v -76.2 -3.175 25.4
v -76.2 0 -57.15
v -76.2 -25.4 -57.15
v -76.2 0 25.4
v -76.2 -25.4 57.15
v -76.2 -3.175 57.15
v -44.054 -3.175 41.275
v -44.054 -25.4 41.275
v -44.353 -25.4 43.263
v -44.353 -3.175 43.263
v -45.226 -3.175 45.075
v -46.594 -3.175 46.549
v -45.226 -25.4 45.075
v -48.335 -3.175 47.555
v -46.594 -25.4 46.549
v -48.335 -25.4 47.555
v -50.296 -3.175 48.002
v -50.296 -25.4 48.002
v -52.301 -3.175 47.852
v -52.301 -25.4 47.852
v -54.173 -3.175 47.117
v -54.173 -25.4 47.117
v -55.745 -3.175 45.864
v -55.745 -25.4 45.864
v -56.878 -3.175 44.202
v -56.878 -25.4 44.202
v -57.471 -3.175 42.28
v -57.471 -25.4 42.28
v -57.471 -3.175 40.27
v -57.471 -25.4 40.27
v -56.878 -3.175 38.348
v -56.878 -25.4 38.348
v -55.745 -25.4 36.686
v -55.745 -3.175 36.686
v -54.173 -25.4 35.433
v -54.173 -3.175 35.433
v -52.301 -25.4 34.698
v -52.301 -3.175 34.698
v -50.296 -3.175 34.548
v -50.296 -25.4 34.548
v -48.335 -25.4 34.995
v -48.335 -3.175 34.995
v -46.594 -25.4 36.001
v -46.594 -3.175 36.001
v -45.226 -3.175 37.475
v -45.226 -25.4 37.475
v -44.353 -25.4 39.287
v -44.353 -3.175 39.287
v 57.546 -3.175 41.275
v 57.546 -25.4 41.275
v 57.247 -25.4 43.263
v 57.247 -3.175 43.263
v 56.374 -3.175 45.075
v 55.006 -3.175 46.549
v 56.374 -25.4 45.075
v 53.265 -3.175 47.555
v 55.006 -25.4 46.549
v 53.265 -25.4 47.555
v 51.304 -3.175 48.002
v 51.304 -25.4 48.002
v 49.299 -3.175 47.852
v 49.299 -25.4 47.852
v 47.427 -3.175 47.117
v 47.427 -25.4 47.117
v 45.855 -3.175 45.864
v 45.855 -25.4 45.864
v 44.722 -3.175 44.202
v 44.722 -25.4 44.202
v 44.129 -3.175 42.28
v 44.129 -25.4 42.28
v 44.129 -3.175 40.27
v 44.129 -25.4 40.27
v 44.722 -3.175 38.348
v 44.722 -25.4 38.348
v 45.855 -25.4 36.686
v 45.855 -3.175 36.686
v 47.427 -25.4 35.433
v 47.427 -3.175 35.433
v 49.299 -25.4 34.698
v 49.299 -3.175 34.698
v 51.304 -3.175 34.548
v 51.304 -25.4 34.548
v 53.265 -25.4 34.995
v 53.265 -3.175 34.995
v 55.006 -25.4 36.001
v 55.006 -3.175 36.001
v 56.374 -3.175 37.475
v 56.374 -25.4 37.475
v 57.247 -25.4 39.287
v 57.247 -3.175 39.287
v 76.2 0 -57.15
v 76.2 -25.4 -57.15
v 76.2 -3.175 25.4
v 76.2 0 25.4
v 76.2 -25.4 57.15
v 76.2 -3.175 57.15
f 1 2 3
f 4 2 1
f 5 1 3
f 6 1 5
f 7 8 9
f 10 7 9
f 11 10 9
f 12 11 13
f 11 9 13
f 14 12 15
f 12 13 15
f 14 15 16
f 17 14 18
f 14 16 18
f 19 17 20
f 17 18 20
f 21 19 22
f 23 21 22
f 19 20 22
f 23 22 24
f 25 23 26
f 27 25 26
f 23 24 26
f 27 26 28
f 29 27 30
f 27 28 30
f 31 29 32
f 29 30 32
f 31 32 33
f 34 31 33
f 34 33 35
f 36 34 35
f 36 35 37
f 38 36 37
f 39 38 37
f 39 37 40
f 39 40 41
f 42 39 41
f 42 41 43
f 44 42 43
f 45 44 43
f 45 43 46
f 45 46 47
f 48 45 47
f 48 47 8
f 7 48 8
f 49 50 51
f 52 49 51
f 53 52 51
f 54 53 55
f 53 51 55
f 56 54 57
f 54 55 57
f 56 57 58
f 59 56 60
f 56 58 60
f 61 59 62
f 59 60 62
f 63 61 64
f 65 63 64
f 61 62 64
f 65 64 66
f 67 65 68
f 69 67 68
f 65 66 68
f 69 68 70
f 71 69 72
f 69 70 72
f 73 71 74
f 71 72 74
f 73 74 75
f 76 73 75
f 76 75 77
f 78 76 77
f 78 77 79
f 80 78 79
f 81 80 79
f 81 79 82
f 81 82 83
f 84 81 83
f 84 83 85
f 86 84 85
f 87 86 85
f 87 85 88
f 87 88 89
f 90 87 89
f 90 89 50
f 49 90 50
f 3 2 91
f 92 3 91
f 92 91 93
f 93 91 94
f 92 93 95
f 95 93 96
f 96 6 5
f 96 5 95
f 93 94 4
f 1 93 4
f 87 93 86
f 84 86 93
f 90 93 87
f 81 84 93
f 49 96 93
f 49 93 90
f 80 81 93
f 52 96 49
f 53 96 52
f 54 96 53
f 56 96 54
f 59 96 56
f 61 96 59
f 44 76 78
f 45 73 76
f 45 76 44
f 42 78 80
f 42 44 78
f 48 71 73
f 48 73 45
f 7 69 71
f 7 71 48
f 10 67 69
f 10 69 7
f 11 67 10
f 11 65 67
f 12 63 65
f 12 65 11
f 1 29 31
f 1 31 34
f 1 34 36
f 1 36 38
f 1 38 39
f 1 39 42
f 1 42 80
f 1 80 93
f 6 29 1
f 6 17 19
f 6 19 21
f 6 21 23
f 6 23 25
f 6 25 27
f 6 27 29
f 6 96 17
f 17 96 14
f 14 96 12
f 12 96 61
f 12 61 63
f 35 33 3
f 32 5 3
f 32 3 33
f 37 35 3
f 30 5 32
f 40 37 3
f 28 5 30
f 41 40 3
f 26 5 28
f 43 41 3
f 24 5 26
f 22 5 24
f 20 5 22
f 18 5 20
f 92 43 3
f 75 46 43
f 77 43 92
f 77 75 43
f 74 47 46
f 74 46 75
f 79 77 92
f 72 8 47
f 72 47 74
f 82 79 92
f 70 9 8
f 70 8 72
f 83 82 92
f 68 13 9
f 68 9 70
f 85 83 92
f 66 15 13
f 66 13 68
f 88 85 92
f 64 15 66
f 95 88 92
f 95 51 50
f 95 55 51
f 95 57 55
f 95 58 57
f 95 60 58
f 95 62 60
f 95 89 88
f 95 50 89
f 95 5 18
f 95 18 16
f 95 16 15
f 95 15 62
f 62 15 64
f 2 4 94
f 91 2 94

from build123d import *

# Parameters (mm, degrees)
F0_W     = 152.4
F0_H     = 114.3
F1_DEPTH = 25.4
F2_W     = 152.4
F2_H     = 31.75
F3_DEPTH = 3.175
F5_D     = 13.49248


with BuildPart() as f1:
    # F0 (on Front) → F1 (new body)
    with BuildSketch(Plane.XZ):
        Rectangle(F0_W, F0_H)
    extrude(amount=F1_DEPTH)

    # F2 (on face) → F3 (cut)
    with BuildSketch(Plane(origin=(0, 0, 0), x_dir=(-1, 0, 0), z_dir=(0, 1, 0))):
        with Locations((0, 41.275)):
            Rectangle(F2_W, F2_H)
    extrude(amount=-F3_DEPTH, mode=Mode.SUBTRACT)

    # F5 (through all)
    with Locations(Plane(origin=(0, -3.175, 0), x_dir=(-1, 0, 0), z_dir=(0, 1, 0))):
        with Locations((50.8, 41.275), (-50.8, 41.275)):
            Hole(F5_D / 2)


solid = f1.part
